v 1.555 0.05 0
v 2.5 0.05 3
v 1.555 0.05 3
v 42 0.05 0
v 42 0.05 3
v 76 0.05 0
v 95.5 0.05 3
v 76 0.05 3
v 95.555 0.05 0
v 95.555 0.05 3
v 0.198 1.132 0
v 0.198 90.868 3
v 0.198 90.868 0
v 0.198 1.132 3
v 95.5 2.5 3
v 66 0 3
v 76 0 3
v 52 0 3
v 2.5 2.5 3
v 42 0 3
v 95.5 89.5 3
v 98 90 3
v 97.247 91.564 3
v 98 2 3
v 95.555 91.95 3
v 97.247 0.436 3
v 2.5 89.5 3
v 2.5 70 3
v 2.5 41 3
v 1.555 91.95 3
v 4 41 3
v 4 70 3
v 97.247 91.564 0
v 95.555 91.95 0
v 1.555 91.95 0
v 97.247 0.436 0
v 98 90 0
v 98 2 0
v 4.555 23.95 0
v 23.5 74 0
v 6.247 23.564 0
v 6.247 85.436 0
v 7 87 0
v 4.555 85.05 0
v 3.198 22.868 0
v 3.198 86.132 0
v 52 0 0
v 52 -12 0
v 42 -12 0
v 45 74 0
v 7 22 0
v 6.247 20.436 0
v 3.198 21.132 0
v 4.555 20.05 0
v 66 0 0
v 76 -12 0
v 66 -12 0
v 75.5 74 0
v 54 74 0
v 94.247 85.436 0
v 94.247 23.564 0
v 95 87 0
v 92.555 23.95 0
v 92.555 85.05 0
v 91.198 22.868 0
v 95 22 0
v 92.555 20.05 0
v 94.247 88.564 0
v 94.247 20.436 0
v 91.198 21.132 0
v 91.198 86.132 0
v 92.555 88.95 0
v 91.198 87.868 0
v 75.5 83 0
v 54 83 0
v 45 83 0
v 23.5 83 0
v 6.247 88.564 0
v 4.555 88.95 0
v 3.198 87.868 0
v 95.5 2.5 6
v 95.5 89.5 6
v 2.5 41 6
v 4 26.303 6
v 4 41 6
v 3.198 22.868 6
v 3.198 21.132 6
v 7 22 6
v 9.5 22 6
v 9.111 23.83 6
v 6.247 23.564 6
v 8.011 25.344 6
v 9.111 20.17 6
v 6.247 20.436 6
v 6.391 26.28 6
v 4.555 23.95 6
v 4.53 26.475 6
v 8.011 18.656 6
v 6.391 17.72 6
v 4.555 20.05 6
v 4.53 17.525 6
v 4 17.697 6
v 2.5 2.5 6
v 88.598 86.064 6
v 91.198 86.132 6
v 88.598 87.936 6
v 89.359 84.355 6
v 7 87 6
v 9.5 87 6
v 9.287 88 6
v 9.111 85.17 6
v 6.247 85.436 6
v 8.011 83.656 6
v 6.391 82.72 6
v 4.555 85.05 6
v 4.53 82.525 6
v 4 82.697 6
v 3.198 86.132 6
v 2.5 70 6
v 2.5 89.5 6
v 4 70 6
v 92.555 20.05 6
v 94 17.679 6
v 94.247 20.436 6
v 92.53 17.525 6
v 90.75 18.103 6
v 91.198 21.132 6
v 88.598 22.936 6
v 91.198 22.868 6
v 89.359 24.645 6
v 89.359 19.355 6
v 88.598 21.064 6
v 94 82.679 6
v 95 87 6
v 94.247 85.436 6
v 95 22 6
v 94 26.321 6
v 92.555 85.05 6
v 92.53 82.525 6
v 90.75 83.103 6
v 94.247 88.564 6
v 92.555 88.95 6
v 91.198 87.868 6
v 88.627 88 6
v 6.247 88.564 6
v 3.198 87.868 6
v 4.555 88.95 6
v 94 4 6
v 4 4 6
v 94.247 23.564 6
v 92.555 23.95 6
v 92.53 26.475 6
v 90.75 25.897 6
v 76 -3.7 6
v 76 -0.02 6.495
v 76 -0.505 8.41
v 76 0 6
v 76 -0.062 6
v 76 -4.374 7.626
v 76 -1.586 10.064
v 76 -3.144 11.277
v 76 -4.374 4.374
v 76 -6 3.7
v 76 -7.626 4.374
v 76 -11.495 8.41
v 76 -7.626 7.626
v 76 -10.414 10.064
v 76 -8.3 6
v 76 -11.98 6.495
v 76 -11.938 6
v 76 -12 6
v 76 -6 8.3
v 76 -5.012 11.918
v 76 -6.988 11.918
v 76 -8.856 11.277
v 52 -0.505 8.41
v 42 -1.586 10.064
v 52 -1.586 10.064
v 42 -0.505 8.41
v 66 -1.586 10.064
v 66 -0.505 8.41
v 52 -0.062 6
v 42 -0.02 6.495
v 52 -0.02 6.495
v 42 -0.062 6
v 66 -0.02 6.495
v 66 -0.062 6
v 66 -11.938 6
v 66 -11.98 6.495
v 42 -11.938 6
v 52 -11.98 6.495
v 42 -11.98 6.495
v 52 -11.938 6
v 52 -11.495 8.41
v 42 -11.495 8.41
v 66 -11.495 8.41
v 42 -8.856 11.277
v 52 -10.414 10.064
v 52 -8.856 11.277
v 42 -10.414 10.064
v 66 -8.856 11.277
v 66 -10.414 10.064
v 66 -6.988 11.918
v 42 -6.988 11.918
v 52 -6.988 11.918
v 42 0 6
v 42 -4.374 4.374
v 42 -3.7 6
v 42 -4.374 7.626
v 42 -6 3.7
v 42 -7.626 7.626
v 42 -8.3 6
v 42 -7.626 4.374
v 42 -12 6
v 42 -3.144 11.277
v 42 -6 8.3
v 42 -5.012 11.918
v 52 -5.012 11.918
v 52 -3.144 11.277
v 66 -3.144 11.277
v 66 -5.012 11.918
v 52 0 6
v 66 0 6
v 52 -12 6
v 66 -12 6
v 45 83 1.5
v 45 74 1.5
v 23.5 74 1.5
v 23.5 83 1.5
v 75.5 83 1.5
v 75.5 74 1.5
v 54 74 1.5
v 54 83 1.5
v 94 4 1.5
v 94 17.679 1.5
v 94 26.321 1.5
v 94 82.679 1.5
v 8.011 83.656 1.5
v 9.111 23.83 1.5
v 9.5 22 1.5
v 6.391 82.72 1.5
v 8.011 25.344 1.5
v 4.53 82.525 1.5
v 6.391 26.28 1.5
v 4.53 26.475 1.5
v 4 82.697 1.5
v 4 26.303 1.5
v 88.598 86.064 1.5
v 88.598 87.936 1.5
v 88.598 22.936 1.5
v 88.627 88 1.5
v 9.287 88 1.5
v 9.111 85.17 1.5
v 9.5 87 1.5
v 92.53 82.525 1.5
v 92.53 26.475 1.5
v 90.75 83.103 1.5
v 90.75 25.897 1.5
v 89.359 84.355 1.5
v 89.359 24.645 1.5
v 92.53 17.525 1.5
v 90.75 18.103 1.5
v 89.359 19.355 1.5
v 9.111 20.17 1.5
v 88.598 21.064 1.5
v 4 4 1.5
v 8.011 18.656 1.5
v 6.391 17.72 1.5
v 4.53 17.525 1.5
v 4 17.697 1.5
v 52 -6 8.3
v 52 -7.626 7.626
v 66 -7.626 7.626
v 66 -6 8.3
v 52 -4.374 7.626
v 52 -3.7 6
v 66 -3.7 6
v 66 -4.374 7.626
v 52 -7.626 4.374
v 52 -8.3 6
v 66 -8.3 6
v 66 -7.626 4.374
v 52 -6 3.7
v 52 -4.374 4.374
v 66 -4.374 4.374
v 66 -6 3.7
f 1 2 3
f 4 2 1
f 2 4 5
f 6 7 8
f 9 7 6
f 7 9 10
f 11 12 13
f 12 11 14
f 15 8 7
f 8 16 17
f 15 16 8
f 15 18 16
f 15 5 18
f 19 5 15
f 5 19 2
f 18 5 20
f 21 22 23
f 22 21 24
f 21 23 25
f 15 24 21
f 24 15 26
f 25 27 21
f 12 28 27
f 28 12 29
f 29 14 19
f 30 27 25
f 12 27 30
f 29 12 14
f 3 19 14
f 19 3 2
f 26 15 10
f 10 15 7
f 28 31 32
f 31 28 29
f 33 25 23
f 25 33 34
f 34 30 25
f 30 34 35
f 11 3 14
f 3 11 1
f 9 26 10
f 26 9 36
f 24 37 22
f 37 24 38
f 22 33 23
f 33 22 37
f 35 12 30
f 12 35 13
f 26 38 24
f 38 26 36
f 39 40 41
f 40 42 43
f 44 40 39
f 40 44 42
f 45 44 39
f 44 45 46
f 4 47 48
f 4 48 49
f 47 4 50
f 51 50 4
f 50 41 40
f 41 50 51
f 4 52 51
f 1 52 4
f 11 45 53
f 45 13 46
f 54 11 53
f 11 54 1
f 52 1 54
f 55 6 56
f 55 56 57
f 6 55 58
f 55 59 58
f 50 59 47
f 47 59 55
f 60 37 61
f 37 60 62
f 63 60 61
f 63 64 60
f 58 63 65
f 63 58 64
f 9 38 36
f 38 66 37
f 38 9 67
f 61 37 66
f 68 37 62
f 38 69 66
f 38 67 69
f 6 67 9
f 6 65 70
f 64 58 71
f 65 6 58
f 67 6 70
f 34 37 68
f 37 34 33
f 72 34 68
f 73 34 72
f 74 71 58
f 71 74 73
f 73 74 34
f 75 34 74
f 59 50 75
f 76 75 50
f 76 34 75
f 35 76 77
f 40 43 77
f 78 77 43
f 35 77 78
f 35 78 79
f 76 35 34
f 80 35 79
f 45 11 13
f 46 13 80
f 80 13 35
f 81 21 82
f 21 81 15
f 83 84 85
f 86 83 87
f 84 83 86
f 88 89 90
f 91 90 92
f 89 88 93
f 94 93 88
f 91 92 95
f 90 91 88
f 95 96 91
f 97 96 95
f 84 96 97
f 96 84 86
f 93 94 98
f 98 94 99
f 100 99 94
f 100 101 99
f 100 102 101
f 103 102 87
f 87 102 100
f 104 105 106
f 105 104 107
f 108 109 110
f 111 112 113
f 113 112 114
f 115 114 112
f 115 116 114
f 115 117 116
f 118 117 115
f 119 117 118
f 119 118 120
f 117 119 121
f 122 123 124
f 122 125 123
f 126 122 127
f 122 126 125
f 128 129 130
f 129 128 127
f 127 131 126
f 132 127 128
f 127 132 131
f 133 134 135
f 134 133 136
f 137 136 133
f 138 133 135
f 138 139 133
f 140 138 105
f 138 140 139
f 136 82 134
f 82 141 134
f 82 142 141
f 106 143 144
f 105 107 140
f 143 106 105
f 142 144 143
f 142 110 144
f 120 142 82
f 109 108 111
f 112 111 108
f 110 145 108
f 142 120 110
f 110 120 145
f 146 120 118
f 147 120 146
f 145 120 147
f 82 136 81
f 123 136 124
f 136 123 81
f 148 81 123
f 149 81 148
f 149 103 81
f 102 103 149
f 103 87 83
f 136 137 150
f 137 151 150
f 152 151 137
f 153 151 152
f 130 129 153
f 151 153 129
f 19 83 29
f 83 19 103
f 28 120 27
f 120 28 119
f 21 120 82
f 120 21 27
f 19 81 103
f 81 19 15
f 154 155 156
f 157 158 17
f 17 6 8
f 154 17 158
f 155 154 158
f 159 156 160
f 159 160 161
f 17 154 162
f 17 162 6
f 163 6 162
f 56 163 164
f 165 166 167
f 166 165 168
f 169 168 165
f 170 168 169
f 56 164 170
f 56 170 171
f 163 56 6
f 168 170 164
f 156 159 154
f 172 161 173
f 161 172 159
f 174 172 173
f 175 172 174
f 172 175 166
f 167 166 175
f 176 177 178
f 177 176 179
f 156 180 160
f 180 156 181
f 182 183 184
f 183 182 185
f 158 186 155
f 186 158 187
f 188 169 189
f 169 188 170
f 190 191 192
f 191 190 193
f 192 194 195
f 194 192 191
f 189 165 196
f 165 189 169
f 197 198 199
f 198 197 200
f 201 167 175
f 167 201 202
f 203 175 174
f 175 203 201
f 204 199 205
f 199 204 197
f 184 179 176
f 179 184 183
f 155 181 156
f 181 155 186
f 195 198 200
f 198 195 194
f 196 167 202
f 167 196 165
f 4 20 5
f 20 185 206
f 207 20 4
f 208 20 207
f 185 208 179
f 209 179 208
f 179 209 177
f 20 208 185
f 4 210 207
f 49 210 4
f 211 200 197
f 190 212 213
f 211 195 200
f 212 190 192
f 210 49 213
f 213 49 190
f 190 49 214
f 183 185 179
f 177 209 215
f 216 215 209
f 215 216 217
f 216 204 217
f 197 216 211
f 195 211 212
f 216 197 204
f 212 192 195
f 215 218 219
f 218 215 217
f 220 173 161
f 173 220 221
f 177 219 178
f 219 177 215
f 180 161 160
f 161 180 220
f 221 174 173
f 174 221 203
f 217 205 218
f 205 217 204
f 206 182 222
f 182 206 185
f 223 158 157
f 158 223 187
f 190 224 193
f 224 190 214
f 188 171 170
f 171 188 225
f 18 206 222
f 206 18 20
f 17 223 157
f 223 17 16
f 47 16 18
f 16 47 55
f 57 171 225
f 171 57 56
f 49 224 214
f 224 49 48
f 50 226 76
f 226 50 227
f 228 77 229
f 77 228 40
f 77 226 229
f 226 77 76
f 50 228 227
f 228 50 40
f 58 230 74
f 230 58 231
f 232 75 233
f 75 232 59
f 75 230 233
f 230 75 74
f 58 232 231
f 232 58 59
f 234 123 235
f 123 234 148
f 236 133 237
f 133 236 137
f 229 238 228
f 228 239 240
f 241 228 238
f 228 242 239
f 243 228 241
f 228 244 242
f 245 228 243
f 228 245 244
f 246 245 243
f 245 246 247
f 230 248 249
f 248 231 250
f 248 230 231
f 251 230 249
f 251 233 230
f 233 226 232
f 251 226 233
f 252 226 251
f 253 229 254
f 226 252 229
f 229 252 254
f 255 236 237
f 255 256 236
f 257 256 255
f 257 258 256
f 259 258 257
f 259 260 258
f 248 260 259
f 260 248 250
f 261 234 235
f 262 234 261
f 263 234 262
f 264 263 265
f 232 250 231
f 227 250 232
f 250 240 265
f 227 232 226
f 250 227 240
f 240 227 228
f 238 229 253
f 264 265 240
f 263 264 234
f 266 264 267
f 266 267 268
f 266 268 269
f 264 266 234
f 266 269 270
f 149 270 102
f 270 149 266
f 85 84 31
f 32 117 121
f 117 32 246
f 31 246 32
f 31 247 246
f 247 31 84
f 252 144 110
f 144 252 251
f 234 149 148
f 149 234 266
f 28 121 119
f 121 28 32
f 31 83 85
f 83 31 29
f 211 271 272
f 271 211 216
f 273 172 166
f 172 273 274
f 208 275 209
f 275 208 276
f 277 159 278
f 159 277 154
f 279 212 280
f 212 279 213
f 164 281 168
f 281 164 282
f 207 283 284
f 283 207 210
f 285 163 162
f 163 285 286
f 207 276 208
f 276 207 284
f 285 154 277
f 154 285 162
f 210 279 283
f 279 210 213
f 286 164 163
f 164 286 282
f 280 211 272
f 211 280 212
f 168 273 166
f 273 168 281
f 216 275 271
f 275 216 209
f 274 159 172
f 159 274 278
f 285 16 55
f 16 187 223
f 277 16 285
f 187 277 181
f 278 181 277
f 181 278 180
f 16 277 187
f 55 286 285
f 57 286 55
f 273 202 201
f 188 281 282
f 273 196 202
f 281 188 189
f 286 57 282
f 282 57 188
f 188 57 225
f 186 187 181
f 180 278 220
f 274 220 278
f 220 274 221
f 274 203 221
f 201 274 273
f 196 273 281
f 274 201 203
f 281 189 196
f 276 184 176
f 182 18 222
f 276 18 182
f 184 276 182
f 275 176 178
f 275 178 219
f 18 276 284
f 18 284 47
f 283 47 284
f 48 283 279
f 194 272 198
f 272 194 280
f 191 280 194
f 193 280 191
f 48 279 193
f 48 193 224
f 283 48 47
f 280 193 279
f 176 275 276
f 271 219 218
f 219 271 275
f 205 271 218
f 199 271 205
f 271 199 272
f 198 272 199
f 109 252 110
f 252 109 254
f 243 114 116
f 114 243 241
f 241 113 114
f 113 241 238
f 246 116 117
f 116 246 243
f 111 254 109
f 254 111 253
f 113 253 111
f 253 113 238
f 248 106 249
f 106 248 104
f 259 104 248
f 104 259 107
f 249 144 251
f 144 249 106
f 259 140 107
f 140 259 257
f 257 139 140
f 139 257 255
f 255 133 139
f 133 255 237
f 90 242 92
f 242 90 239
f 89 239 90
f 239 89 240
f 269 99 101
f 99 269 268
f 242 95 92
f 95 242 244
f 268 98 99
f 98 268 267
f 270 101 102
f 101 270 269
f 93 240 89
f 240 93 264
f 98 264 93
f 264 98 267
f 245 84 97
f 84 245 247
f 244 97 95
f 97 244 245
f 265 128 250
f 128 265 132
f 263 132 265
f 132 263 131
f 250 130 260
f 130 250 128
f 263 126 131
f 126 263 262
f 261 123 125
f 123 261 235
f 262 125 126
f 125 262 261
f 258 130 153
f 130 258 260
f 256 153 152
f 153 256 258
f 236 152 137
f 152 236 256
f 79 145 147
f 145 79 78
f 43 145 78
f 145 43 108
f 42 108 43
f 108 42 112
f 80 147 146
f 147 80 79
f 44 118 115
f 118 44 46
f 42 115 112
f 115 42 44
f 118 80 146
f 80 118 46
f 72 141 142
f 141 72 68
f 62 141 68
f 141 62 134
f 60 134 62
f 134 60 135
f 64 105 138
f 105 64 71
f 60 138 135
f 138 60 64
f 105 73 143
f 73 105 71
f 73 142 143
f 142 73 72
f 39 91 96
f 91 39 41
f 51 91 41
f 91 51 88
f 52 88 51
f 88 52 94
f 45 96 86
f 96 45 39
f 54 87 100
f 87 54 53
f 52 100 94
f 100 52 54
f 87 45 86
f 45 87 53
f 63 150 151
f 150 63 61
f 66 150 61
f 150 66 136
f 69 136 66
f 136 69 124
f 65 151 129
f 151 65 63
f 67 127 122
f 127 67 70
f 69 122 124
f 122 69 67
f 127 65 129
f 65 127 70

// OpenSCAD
// ..............................
// Prusa i3 Things
// LCD Box_back
// Oktay Gülmez
// 02/07/2014
// GNU GPL v3
// ..............................

module back(){
difference(){
  union(){
    minkowski(){
         translate([2,2,0]) cube([94,88,2]);
       cylinder(r=2);
    }
   translate([2.5,2.5,0]) cube([93,87,6]); 

    
         translate([42,-6,6]) rotate([0,90,0]) cylinder(h=34, r=6);
   translate([42,-12,0]) cube([34,12,6]);  
   translate([42,-12,0]) cube([34,15,3]);   
     
  }
 translate([23.5,74,0]) cube([21.5,9,10]);
 translate([54,74,0]) cube([21.5,9,10]);
  
 
   translate([4,4,1.5]) cube([90,84,10]); 

 translate([0,41,3]) cube([10,29,15]);

  translate([40,-6,6]) rotate([0,90,0]) cylinder(h=38, r=2.3);

  translate([52,-13,0]) cube([14,13,13]); 
}
}

difference(){
  union(){
    back();
     translate([5,87,0]) cylinder(h=6, r=4.5);
    translate([93,87,0]) cylinder(h=6, r=4.5);
    translate([5,22,0]) cylinder(h=6, r=4.5);
    translate([93,22,0]) cylinder(h=6, r=4.5);
  }
   translate([5,87,0]) cylinder(h=8, r=2);
    translate([93,87,0]) cylinder(h=8, r=2);
    translate([5,22,0]) cylinder(h=8, r=2);
    translate([93,22,0]) cylinder(h=8, r=2);
 
 translate([0,0,3]) cube([2.5,100,10]);
 translate([95.5,0,3]) cube([2.5,100,10]);
 translate([0,89.5,3]) cube([100,2.5,10]);
}
